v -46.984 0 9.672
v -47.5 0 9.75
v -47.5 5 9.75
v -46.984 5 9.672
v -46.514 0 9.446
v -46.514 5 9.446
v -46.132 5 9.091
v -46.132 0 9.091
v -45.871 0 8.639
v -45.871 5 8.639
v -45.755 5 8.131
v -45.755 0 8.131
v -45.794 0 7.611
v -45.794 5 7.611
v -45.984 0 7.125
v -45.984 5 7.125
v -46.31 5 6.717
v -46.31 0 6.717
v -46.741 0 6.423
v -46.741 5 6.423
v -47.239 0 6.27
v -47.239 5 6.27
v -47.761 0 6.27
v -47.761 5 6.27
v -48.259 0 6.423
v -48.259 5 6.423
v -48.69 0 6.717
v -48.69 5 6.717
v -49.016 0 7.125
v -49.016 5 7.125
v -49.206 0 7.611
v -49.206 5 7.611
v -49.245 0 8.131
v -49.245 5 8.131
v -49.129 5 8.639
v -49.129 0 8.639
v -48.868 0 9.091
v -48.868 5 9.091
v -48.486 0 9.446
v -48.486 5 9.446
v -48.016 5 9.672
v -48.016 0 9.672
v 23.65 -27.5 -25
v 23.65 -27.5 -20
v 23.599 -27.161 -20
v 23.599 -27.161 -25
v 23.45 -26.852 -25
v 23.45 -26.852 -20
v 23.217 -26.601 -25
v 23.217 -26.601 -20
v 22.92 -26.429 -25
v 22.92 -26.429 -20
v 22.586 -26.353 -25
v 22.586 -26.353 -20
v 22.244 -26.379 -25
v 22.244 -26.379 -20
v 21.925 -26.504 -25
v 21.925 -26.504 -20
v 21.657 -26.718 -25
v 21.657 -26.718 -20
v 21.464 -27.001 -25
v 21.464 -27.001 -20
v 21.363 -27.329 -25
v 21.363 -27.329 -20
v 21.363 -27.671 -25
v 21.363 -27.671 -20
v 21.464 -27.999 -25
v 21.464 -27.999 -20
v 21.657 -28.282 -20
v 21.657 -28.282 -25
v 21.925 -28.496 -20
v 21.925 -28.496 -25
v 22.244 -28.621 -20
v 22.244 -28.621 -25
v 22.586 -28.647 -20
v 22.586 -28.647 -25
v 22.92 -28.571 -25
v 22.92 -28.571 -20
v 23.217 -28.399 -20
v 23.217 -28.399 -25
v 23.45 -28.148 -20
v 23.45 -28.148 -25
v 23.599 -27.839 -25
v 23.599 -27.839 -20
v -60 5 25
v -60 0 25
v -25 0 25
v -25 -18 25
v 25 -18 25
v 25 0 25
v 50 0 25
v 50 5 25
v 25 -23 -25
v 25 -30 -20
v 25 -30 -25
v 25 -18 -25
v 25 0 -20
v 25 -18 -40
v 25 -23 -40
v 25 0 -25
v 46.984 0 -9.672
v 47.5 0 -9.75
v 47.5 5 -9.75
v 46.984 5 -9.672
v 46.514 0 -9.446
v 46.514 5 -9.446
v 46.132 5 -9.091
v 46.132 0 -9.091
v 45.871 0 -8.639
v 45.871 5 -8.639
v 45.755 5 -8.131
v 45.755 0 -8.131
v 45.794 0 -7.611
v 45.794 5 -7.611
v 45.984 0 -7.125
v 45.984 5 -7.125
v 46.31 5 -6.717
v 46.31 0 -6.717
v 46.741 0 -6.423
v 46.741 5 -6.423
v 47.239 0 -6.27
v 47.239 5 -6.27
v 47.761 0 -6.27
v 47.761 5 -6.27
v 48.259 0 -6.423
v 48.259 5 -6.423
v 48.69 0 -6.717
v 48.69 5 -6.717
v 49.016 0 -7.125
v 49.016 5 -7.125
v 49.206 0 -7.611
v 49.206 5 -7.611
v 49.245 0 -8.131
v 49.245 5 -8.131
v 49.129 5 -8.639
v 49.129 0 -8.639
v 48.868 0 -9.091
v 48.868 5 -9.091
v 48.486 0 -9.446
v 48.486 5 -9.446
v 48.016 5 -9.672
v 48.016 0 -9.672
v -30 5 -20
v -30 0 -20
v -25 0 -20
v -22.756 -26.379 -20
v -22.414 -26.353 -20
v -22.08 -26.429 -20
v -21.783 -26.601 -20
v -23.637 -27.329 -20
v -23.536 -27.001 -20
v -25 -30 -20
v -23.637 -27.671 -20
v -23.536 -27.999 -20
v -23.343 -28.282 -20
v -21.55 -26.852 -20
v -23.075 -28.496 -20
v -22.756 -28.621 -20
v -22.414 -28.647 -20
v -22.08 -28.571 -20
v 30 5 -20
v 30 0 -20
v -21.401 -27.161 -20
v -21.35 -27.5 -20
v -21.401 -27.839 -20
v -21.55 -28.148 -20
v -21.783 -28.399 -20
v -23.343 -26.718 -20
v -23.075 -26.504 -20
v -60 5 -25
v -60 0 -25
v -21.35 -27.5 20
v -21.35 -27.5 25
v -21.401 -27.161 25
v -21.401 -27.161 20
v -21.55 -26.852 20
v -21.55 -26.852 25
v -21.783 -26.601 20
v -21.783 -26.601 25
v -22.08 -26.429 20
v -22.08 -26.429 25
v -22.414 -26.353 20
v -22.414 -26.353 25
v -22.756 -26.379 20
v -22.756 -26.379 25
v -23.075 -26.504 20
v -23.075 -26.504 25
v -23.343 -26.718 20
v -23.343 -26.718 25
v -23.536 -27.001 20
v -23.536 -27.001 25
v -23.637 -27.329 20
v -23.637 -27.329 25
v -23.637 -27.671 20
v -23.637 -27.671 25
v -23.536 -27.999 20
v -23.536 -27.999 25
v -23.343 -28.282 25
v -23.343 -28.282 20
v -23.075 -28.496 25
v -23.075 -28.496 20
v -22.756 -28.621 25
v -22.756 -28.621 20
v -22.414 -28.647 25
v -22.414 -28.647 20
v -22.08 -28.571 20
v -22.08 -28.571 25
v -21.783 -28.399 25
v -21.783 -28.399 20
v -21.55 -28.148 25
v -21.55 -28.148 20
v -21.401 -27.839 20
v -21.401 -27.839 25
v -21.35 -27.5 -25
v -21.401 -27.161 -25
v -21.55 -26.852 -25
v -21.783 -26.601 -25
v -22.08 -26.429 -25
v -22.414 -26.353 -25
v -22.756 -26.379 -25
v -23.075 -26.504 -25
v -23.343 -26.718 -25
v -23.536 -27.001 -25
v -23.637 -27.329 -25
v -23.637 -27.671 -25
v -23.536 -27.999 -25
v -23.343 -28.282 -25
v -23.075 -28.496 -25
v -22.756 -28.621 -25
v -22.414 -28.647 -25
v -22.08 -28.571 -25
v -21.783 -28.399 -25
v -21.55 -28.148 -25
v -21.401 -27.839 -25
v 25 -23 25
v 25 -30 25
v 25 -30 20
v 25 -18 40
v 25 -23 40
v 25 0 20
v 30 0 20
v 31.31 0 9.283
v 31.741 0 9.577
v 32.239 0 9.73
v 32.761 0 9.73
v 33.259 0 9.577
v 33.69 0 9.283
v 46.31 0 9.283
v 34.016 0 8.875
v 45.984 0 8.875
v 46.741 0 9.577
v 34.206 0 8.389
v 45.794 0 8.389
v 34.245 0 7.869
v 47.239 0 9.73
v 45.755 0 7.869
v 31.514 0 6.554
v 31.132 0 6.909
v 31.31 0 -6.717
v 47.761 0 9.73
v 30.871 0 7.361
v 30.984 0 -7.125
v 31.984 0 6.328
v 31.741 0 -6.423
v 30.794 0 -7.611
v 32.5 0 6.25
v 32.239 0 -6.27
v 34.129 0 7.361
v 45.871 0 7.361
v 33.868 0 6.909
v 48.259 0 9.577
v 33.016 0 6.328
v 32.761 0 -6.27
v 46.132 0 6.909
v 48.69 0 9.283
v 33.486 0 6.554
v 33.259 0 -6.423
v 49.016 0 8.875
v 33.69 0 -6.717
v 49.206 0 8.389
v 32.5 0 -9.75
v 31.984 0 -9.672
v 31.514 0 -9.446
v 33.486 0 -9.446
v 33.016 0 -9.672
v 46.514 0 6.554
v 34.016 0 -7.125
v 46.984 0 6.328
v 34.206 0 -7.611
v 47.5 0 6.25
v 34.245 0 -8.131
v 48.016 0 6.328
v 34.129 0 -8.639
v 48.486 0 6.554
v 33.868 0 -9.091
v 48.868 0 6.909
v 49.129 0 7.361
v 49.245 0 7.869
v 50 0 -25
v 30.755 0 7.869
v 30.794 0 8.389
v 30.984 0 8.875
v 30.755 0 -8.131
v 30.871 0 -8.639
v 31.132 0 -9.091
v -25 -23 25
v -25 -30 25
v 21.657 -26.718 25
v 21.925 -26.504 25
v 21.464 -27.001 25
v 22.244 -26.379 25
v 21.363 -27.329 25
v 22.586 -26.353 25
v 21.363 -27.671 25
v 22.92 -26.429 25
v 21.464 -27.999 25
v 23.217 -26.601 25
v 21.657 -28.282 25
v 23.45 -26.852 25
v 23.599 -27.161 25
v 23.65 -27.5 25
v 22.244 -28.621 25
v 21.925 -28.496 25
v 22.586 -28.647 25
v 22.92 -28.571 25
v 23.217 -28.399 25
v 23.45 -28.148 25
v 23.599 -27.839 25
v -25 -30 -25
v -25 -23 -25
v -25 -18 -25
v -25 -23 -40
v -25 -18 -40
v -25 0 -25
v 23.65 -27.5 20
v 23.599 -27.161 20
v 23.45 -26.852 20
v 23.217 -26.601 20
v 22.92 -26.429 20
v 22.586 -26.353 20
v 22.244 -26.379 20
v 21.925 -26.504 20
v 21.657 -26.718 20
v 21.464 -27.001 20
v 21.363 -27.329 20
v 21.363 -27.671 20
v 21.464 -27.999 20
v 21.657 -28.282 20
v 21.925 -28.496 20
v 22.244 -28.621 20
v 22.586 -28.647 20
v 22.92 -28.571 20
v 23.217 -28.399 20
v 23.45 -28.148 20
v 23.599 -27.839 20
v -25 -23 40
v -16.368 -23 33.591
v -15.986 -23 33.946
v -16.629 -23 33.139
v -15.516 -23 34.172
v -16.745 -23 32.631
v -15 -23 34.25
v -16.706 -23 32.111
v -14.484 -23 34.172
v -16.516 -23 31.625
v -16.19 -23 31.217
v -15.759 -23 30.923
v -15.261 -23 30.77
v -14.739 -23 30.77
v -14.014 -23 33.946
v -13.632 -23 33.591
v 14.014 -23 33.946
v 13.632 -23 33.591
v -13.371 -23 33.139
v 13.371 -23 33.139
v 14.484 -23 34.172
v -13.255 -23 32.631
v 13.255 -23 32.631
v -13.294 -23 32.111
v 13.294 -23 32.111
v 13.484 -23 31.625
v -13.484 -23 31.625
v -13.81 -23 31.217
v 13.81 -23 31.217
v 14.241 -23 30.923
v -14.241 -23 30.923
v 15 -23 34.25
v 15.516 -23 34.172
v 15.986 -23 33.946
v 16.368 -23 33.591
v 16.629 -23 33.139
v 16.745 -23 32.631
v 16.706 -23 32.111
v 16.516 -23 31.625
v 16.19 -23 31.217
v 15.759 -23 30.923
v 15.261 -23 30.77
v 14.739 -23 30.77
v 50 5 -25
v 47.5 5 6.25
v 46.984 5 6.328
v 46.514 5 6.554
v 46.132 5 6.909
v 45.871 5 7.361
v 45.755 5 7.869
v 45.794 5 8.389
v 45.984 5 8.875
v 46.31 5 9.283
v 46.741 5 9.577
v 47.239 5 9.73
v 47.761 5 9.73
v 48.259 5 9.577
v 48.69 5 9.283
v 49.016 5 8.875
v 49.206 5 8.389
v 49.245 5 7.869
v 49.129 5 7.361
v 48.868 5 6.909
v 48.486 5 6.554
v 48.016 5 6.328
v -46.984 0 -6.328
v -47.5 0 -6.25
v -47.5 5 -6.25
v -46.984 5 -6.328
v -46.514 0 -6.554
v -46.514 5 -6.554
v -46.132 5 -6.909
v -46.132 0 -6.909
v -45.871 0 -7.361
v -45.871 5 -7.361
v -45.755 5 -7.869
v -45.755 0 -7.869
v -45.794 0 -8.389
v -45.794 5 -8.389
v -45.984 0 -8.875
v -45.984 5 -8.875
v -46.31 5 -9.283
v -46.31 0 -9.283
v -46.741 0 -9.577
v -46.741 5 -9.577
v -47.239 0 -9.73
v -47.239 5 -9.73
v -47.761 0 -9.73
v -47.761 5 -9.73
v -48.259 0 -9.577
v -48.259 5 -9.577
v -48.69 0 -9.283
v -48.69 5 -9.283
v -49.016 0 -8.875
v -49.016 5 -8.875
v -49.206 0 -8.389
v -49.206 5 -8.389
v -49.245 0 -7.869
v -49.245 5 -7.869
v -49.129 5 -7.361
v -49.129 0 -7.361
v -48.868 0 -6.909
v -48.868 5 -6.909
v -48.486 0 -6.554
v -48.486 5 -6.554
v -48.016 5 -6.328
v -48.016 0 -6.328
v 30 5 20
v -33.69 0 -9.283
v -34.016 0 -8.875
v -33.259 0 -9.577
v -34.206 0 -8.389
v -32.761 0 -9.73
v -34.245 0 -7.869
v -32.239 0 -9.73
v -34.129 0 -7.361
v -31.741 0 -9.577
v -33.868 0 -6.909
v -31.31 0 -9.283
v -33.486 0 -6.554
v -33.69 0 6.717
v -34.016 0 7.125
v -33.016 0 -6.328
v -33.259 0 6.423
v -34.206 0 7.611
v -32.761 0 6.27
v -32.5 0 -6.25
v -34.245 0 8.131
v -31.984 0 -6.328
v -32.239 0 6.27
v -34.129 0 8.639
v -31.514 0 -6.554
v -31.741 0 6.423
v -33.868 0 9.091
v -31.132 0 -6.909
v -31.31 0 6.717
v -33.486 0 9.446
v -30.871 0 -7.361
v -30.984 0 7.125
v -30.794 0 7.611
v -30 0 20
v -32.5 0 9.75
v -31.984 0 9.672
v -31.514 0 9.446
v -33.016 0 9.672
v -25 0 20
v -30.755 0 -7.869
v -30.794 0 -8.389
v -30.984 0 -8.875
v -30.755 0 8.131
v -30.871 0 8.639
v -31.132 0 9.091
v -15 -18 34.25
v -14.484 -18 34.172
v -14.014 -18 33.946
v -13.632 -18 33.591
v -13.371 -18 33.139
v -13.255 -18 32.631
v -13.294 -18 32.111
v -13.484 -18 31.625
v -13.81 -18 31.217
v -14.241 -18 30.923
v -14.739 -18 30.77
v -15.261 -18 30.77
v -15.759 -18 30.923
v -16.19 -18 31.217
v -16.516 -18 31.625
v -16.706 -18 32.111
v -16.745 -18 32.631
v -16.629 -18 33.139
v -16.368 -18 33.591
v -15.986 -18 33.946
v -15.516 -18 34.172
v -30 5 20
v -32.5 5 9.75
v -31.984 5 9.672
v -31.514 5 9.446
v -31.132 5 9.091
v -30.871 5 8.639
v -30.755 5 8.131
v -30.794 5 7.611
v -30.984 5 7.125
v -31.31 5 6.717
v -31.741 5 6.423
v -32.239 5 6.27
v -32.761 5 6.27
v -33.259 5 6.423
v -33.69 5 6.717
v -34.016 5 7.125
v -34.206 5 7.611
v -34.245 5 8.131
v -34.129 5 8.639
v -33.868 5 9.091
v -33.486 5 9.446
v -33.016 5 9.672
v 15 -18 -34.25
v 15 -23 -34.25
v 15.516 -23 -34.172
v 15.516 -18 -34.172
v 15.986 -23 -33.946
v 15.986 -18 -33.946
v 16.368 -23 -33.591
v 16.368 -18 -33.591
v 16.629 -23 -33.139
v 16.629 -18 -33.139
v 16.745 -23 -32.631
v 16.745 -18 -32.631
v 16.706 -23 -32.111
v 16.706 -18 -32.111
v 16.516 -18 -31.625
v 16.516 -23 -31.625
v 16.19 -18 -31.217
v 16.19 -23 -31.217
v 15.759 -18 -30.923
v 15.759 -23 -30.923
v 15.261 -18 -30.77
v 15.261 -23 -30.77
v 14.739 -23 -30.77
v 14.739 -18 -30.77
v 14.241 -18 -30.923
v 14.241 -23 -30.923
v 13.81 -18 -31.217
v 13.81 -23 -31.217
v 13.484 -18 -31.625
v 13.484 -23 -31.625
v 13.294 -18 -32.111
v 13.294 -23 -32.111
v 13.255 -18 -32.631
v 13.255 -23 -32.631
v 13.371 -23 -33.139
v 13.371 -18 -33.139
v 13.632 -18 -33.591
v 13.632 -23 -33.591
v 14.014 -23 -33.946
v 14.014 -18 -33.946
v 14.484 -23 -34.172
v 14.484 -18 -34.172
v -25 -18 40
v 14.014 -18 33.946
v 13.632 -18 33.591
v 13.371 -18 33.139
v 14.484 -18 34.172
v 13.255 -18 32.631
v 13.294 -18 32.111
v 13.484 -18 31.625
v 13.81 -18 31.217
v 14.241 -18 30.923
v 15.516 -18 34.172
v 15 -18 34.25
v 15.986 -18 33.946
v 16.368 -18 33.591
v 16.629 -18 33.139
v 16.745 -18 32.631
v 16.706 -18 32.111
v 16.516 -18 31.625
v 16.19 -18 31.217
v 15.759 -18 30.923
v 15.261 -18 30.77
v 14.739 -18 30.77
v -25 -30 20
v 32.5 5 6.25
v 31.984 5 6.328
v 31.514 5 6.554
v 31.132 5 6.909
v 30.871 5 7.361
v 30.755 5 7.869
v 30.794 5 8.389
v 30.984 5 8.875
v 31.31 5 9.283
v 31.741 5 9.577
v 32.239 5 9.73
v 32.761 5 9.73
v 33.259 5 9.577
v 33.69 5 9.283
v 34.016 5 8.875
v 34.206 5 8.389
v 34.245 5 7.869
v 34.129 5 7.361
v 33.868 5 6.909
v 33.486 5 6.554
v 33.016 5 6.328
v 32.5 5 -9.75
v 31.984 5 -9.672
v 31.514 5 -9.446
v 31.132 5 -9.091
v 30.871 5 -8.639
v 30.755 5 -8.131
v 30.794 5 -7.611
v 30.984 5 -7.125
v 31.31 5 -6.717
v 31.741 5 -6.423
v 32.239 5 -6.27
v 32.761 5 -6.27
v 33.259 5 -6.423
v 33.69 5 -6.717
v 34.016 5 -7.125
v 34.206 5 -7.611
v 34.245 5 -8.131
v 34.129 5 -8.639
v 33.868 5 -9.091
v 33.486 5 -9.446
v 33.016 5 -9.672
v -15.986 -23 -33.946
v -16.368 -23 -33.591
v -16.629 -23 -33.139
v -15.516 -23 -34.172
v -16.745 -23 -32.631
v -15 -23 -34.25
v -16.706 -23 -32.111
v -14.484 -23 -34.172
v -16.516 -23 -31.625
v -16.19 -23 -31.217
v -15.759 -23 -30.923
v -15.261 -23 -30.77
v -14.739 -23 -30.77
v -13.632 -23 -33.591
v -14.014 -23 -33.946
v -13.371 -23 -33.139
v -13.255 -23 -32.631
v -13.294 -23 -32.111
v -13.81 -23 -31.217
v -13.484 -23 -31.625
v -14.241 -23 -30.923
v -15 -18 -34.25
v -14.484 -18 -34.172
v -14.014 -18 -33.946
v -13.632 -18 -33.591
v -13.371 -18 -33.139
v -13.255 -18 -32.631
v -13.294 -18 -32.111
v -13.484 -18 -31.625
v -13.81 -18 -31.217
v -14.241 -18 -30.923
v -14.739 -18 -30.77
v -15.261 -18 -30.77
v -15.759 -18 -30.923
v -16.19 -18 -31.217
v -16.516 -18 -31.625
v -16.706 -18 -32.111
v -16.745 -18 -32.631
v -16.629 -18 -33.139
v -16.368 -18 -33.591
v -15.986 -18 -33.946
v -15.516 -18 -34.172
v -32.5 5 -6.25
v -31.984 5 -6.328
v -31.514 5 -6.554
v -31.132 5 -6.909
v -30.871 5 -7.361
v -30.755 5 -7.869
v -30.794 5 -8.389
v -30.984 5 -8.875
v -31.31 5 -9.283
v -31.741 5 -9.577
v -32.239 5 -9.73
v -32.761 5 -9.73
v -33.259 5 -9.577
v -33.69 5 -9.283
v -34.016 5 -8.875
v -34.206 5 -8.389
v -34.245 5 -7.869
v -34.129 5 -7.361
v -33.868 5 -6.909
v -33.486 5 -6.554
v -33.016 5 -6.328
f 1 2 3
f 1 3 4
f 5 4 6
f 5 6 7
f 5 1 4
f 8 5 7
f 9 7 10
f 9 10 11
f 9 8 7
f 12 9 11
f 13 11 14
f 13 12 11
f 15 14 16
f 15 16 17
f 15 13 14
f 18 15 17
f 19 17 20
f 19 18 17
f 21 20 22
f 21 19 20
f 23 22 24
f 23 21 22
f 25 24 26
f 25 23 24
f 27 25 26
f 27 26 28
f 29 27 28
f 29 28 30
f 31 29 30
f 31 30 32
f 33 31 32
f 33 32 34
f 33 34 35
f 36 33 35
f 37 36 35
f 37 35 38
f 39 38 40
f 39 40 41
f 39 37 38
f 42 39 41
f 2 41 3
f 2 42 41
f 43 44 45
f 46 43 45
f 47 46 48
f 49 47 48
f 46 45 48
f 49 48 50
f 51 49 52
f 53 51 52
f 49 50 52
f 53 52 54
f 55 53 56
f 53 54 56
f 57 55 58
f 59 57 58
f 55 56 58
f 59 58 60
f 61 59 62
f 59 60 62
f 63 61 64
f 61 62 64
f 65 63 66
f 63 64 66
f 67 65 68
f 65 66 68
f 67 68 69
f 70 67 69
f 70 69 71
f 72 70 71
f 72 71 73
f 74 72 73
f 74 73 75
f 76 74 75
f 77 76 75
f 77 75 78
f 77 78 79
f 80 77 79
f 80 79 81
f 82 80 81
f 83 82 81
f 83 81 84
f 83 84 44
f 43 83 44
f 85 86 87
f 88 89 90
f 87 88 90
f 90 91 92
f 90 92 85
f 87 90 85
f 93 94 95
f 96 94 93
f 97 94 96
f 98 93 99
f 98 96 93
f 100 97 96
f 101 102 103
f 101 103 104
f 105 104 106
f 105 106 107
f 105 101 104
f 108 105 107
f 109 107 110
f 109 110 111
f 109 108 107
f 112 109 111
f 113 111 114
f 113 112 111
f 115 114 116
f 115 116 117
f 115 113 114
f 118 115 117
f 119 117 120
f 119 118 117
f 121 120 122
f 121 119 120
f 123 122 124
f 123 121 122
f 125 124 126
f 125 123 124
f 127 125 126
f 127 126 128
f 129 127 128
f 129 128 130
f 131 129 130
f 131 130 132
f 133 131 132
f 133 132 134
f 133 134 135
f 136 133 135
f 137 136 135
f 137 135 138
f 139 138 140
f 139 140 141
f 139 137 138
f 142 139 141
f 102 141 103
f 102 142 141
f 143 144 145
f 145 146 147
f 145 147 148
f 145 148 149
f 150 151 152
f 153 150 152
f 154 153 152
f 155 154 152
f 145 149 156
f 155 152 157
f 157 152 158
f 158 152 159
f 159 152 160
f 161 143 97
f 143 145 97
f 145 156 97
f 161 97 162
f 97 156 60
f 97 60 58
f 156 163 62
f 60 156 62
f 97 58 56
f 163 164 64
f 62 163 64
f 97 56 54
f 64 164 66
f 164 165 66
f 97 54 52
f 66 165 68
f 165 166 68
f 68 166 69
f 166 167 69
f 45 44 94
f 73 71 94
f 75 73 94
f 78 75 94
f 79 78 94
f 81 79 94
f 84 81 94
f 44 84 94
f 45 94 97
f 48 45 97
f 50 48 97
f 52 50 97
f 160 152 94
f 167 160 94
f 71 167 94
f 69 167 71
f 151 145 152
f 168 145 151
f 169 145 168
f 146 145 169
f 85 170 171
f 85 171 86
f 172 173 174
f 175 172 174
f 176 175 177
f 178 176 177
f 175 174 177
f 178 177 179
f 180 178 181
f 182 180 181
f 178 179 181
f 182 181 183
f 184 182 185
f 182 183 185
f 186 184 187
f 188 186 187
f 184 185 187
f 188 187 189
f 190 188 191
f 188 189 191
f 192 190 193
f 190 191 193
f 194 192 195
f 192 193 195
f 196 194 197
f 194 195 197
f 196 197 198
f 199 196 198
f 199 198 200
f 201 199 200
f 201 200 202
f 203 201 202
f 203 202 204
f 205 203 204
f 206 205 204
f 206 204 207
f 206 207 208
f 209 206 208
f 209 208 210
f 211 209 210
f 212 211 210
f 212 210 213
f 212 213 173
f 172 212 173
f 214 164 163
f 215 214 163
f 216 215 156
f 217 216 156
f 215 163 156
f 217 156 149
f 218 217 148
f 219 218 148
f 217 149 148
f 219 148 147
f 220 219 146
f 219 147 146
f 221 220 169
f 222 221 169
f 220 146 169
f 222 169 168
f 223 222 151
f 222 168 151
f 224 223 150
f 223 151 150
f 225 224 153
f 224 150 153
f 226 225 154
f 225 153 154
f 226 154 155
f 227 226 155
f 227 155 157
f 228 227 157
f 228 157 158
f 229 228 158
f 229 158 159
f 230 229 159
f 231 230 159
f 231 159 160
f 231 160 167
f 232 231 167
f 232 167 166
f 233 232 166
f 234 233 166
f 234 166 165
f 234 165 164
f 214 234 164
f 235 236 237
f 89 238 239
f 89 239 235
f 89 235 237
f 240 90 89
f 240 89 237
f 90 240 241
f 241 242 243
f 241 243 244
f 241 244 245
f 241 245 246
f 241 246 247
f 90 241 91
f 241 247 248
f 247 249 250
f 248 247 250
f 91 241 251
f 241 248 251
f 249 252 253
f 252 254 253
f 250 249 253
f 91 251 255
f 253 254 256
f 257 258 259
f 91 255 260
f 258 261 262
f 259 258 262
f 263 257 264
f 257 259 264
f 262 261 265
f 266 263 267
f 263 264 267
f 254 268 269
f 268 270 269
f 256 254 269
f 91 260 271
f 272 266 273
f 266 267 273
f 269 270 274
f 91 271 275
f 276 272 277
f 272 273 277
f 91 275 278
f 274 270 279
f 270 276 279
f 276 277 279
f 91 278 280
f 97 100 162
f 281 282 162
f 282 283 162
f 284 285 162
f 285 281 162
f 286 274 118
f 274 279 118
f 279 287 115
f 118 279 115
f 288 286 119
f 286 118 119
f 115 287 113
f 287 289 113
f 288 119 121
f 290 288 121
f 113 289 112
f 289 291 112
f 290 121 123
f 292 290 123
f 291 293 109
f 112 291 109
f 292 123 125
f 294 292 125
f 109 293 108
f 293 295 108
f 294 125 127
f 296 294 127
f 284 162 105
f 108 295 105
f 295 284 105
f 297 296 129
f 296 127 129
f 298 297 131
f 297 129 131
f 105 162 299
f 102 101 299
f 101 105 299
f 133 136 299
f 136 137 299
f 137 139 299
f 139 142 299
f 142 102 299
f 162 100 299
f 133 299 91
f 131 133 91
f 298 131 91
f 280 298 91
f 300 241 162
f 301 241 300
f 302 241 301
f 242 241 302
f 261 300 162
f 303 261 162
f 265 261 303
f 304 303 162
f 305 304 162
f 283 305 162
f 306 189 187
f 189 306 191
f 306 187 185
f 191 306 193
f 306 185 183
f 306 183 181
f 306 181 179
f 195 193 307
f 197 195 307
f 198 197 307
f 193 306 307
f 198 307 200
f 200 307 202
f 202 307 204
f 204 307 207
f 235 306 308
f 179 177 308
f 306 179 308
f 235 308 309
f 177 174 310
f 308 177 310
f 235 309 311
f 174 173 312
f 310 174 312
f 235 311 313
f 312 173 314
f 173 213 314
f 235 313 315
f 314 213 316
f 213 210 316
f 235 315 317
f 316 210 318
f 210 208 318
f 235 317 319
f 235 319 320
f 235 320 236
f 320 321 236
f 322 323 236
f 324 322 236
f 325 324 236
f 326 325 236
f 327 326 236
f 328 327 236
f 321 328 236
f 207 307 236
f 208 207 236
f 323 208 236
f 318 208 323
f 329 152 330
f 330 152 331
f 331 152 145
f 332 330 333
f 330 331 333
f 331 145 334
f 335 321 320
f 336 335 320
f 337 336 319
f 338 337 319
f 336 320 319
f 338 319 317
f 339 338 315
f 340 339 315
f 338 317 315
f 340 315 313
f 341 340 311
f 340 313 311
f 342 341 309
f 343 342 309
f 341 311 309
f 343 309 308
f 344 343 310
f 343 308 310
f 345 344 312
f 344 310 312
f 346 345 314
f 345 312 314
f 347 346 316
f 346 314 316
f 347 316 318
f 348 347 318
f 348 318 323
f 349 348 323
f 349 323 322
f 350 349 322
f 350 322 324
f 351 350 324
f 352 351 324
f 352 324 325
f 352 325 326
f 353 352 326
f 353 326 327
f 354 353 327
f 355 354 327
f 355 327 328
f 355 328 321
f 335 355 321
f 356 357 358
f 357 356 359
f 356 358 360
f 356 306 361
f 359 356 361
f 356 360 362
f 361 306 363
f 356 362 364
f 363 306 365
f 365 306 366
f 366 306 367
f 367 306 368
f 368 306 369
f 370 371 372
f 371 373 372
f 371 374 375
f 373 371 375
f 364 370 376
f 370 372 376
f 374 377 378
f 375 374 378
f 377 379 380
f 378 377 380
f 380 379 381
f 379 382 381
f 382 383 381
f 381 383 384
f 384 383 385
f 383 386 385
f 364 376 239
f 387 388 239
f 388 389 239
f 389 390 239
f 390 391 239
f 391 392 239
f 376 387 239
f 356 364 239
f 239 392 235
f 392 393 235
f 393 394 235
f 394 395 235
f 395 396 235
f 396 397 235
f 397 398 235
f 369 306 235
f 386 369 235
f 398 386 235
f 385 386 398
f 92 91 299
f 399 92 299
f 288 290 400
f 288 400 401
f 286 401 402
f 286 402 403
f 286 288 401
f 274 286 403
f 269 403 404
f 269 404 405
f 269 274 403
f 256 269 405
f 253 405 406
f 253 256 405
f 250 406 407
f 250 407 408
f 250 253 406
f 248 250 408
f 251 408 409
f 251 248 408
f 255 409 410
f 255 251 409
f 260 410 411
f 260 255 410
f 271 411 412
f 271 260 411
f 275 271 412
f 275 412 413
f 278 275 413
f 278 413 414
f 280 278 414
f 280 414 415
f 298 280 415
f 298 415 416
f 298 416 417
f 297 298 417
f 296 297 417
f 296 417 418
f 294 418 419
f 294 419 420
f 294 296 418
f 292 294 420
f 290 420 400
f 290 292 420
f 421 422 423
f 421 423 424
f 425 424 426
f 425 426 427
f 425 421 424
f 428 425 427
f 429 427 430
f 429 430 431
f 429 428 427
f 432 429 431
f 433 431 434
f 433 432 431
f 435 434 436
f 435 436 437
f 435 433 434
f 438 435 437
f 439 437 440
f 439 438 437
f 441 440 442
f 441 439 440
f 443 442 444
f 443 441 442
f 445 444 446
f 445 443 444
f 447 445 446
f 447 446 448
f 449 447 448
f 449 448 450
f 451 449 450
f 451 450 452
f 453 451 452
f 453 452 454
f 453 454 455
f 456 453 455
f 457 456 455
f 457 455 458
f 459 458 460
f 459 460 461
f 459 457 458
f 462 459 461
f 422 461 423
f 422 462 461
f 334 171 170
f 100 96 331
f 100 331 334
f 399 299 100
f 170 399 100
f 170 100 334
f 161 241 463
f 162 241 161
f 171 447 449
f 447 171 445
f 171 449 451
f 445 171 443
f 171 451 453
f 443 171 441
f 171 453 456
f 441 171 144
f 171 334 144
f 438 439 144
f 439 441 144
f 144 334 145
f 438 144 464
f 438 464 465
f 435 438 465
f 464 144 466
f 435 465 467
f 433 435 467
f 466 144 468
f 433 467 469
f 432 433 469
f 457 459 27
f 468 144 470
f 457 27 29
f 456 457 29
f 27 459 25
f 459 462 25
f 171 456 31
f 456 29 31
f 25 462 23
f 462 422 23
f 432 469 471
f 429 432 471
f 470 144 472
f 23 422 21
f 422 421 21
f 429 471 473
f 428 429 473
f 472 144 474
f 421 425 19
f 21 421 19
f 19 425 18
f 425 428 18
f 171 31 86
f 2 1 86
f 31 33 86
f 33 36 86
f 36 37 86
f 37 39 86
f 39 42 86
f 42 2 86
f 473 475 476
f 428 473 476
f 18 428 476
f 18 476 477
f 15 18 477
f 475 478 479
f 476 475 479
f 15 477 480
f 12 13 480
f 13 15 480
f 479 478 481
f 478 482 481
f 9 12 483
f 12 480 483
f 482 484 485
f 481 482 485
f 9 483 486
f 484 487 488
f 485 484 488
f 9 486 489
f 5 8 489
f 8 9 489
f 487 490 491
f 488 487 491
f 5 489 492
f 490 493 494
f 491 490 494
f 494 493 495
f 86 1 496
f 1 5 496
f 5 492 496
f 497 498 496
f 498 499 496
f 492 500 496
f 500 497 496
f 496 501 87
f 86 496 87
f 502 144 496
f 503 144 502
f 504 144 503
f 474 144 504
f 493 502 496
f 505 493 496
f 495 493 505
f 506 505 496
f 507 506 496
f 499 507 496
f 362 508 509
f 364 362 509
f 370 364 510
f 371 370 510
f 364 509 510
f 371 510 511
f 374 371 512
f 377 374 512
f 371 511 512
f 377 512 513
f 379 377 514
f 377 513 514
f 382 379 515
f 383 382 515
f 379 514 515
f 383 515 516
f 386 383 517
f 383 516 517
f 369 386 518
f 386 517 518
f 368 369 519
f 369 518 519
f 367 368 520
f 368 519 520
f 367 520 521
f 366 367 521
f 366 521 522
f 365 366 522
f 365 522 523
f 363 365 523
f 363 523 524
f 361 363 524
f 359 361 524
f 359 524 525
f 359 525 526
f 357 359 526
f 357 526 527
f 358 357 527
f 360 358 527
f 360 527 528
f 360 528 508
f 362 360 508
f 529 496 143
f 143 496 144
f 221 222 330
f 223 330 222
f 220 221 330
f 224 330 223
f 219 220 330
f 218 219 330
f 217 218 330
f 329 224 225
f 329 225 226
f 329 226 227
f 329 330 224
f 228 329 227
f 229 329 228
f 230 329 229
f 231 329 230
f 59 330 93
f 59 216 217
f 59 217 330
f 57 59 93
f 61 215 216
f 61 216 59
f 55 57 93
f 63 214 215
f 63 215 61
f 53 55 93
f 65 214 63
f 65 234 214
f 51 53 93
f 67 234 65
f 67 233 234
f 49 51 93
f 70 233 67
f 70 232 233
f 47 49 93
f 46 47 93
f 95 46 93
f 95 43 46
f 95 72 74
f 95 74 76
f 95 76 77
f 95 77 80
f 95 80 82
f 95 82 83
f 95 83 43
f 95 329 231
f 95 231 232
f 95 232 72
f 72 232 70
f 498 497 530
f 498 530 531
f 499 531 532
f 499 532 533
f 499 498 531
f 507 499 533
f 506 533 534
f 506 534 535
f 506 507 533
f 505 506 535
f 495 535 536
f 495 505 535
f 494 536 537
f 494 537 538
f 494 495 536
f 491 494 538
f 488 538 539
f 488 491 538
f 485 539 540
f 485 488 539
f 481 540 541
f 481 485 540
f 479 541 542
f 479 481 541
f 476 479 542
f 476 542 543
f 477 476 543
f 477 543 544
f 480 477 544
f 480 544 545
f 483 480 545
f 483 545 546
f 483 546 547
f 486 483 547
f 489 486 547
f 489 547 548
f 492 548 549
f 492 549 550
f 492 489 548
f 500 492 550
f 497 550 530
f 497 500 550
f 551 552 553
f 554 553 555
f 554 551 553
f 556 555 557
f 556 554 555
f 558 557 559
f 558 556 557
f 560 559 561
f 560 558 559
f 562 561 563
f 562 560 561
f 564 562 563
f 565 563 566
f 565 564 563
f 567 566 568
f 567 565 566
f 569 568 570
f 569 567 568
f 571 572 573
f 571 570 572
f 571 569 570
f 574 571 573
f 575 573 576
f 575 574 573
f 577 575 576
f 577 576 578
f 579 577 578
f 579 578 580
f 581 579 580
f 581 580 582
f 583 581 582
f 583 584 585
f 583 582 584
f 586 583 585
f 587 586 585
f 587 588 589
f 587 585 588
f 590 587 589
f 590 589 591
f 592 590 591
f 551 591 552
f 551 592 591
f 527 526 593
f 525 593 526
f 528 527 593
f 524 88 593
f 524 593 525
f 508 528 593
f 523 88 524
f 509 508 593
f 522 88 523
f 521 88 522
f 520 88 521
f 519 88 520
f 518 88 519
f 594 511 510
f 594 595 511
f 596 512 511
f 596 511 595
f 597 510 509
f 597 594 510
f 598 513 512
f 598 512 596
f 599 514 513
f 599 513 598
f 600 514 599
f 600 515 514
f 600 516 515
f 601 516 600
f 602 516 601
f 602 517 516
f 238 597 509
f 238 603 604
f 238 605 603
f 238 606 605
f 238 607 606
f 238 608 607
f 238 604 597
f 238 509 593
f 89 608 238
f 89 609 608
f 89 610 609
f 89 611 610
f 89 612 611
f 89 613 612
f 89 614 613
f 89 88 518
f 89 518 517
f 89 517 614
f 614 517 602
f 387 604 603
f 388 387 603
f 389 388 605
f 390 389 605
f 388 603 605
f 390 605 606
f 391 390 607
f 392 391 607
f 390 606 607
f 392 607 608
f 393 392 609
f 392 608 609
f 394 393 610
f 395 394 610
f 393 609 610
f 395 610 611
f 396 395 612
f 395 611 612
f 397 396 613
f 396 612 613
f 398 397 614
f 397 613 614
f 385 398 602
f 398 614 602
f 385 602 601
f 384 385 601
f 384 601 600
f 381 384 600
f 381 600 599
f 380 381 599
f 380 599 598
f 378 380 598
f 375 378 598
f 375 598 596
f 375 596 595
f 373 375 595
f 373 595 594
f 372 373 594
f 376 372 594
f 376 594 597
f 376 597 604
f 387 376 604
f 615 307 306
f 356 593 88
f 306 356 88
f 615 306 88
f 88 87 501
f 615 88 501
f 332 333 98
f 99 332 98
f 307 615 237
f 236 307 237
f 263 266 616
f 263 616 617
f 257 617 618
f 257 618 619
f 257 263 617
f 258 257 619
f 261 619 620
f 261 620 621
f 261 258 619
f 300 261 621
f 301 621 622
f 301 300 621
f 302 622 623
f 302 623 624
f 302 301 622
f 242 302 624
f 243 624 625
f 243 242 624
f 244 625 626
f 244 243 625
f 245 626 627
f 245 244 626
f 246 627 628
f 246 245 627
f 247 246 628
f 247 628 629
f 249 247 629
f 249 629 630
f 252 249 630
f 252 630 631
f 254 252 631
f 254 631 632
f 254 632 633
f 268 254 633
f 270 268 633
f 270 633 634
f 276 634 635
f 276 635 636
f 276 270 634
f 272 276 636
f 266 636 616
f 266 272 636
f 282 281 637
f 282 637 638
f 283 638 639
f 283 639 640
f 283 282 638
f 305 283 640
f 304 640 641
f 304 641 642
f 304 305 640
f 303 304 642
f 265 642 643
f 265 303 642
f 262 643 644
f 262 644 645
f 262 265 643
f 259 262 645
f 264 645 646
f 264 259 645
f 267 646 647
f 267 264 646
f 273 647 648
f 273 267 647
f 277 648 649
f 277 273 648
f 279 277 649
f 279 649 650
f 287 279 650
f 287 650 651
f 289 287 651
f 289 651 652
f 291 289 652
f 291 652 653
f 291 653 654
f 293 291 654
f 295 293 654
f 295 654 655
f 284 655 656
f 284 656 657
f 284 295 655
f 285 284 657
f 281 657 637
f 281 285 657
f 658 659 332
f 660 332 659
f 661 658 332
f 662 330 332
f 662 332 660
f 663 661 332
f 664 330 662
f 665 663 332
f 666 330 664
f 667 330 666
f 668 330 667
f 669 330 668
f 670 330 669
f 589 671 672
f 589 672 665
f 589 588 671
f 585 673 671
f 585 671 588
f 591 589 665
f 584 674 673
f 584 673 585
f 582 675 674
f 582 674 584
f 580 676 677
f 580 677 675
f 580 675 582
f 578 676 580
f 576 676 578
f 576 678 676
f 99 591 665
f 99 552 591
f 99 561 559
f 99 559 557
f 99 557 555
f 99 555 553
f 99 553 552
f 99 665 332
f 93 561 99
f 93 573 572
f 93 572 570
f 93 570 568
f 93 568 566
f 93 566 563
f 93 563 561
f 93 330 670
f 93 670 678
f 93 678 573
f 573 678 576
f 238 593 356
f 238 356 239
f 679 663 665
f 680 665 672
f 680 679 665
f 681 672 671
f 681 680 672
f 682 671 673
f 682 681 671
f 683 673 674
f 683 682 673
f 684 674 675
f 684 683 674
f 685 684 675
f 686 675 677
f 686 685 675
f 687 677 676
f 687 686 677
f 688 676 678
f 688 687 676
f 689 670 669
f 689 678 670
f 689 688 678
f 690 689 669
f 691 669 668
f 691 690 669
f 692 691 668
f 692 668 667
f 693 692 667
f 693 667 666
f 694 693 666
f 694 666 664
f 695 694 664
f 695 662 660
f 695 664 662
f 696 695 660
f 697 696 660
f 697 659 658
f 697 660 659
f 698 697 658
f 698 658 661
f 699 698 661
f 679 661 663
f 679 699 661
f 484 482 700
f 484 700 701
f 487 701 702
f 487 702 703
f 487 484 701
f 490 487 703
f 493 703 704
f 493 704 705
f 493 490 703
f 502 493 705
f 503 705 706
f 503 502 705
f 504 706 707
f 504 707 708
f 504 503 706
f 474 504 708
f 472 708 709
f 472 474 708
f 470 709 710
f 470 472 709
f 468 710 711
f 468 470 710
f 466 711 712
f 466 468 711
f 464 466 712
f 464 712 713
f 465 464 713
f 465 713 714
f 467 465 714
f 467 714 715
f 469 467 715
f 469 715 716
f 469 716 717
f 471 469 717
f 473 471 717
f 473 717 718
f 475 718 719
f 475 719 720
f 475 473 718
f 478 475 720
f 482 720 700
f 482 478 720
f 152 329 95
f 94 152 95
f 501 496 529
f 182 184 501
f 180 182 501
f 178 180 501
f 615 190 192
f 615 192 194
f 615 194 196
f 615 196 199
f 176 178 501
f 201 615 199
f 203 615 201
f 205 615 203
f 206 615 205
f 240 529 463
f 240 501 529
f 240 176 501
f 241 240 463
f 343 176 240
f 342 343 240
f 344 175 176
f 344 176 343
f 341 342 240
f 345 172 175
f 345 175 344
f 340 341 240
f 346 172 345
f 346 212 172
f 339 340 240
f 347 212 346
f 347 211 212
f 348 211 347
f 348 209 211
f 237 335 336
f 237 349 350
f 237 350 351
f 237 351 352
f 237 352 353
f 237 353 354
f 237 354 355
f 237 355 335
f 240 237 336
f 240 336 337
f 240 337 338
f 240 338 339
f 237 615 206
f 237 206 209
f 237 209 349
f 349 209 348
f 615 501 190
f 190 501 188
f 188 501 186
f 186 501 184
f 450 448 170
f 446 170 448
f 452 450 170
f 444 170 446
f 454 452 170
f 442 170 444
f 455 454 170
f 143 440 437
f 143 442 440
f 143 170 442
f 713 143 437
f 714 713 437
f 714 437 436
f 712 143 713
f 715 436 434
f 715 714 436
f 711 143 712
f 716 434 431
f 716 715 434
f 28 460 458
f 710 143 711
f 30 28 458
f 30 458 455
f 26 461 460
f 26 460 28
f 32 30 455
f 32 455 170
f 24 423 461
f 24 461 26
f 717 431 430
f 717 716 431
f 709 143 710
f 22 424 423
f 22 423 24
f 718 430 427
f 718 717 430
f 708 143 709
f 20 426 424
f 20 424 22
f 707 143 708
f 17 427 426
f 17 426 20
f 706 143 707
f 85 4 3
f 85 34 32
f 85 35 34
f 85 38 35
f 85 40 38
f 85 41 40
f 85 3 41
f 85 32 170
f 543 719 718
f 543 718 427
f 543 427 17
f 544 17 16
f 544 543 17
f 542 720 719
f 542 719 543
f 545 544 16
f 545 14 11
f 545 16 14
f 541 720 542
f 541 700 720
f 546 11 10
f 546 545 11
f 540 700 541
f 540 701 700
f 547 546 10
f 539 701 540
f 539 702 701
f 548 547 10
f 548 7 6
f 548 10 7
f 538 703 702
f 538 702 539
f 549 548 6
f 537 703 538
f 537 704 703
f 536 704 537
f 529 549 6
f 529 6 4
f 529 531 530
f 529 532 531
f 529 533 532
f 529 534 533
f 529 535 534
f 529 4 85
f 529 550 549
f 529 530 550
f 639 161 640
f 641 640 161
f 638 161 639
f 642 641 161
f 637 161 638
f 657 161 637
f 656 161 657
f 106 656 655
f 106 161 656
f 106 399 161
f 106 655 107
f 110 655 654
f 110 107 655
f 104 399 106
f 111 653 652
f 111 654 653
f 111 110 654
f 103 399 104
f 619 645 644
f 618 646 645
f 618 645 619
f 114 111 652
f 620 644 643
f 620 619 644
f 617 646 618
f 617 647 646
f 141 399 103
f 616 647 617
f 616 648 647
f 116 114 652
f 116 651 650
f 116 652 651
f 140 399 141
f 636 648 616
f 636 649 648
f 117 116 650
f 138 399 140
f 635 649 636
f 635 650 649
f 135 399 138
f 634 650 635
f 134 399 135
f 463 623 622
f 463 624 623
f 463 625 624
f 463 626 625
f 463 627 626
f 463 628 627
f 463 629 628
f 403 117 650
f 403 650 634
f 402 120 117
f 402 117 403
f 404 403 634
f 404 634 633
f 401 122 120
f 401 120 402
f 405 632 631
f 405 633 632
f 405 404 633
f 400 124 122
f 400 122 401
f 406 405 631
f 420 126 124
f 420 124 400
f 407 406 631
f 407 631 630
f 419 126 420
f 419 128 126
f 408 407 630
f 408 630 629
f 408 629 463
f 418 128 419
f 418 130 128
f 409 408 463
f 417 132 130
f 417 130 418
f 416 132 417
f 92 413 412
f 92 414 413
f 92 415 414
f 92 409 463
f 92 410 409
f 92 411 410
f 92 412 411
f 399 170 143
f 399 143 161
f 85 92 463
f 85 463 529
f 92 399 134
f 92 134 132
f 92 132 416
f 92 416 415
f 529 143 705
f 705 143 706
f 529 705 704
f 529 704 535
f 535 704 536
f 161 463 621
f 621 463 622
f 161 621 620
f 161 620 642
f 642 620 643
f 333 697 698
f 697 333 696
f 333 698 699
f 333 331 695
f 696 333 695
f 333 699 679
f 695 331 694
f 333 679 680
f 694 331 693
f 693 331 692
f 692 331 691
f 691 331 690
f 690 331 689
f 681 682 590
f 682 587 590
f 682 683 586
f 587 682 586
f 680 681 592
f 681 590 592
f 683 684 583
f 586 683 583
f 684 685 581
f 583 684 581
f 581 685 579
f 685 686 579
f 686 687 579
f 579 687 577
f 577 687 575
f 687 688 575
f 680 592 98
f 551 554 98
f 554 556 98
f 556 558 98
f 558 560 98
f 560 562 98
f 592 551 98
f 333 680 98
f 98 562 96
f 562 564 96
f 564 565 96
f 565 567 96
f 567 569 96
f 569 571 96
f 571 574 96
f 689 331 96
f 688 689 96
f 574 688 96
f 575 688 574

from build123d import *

# Parameters (mm, degrees)
SKETCH3_W               = 100
SKETCH3_H               = 50
SKETCH3_R               = 1.75
BOSS_EXTRUDE1_DEPTH     = 5
CUT_EXTRUDE1_DEPTH      = 57.124860802
CUT_EXTRUDE1_DEPTH_BACK = 57.124860802
SKETCH4_W               = 60
SKETCH4_H               = 40
SKETCH5_W               = 50
SKETCH5_H               = 5
BOSS_EXTRUDE2_DEPTH     = 30
SKETCH6_W               = 50
SKETCH6_H               = 5
BOSS_EXTRUDE3_DEPTH     = 15
SKETCH7_R               = 1.75
CUT_EXTRUDE2_DEPTH      = 69.036754773
SKETCH8_R               = 1.15
CUT_EXTRUDE3_DEPTH      = 88.321245983
SKETCH9_W               = 50
SKETCH9_H               = 5
BOSS_EXTRUDE4_DEPTH     = 10


with BuildPart() as part:
    # Sketch3 → Boss-Extrude1 (new body)
    with BuildSketch(Plane(origin=(0, 0, 0), x_dir=(1, 0, 0), z_dir=(0, 1, 0))):
        Rectangle(SKETCH3_W, SKETCH3_H)
        with Locations(Location((-47.5, 8, 0), (0, 0, 270))):
            Circle(SKETCH3_R, mode=Mode.SUBTRACT)
        with Locations(Location((-32.5, 8, 0), (0, 0, 270))):
            Circle(SKETCH3_R, mode=Mode.SUBTRACT)
        with Locations(Location((-47.5, -8, 0), (0, 0, 270))):
            Circle(SKETCH3_R, mode=Mode.SUBTRACT)
        with Locations(Location((-32.5, -8, 0), (0, 0, 270))):
            Circle(SKETCH3_R, mode=Mode.SUBTRACT)
        with Locations(Location((47.5, -8, 0), (0, 0, 90))):
            Circle(SKETCH3_R, mode=Mode.SUBTRACT)
        with Locations(Location((47.5, 8, 0), (0, 0, 90))):
            Circle(SKETCH3_R, mode=Mode.SUBTRACT)
        with Locations(Location((32.5, 8, 0), (0, 0, 90))):
            Circle(SKETCH3_R, mode=Mode.SUBTRACT)
        with Locations(Location((32.5, -8, 0), (0, 0, 90))):
            Circle(SKETCH3_R, mode=Mode.SUBTRACT)
    extrude(amount=BOSS_EXTRUDE1_DEPTH)

    # Sketch4 → Cut-Extrude1 (cut, two sides: drawn at the far end of the back side and taken through both)
    with BuildSketch(Plane(origin=(0, 5, 0), x_dir=(1, 0, 0), z_dir=(0, 1, 0)).offset(-CUT_EXTRUDE1_DEPTH_BACK)):
        Rectangle(SKETCH4_W, SKETCH4_H)
    extrude(amount=CUT_EXTRUDE1_DEPTH + CUT_EXTRUDE1_DEPTH_BACK, mode=Mode.SUBTRACT)

    # Sketch5 → Boss-Extrude2 (add)
    with BuildSketch(Plane(origin=(0, 0, 0), x_dir=(1, 0, 0), z_dir=(0, 1, 0))):
        with Locations((0, 22.5)):
            Rectangle(SKETCH5_W, SKETCH5_H)
        with Locations((0, -22.5)):
            Rectangle(SKETCH5_W, SKETCH5_H)
    extrude(amount=-BOSS_EXTRUDE2_DEPTH)

    # Sketch6 → Boss-Extrude3 (add)
    with BuildSketch(Plane.XY.offset(25)):
        with Locations((0, -20.5)):
            Rectangle(SKETCH6_W, SKETCH6_H)
    boss_extrude3 = extrude(amount=BOSS_EXTRUDE3_DEPTH)

    # Sketch7 → Cut-Extrude2 (cut, through all)
    with BuildSketch(Plane(origin=(0, -18, 0), x_dir=(1, 0, 0), z_dir=(0, 1, 0))):
        with Locations(Location((-15, -32.5, 0), (0, 0, 270))):
            Circle(SKETCH7_R)
        with Locations(Location((15, -32.5, 0), (0, 0, 270))):
            Circle(SKETCH7_R)
    cut_extrude2 = extrude(amount=-CUT_EXTRUDE2_DEPTH, mode=Mode.SUBTRACT)

    # Mirror1: Boss-Extrude3, Cut-Extrude2 across plane
    add(boss_extrude3.mirror(Plane.XY))
    add(cut_extrude2.mirror(Plane.XY), mode=Mode.SUBTRACT)

    # Sketch8 → Cut-Extrude3 (cut, through all)
    with BuildSketch(Plane.XY.offset(25)):
        with Locations((-22.5, -27.5)):
            Circle(SKETCH8_R)
        with Locations((22.5, -27.5)):
            Circle(SKETCH8_R)
    extrude(amount=-CUT_EXTRUDE3_DEPTH, mode=Mode.SUBTRACT)

    # Sketch9 → Boss-Extrude4 (add)
    with BuildSketch(Plane.ZY.offset(50)):
        with Locations((0, 2.5)):
            Rectangle(SKETCH9_W, SKETCH9_H)
    extrude(amount=BOSS_EXTRUDE4_DEPTH)


solid = part.part
